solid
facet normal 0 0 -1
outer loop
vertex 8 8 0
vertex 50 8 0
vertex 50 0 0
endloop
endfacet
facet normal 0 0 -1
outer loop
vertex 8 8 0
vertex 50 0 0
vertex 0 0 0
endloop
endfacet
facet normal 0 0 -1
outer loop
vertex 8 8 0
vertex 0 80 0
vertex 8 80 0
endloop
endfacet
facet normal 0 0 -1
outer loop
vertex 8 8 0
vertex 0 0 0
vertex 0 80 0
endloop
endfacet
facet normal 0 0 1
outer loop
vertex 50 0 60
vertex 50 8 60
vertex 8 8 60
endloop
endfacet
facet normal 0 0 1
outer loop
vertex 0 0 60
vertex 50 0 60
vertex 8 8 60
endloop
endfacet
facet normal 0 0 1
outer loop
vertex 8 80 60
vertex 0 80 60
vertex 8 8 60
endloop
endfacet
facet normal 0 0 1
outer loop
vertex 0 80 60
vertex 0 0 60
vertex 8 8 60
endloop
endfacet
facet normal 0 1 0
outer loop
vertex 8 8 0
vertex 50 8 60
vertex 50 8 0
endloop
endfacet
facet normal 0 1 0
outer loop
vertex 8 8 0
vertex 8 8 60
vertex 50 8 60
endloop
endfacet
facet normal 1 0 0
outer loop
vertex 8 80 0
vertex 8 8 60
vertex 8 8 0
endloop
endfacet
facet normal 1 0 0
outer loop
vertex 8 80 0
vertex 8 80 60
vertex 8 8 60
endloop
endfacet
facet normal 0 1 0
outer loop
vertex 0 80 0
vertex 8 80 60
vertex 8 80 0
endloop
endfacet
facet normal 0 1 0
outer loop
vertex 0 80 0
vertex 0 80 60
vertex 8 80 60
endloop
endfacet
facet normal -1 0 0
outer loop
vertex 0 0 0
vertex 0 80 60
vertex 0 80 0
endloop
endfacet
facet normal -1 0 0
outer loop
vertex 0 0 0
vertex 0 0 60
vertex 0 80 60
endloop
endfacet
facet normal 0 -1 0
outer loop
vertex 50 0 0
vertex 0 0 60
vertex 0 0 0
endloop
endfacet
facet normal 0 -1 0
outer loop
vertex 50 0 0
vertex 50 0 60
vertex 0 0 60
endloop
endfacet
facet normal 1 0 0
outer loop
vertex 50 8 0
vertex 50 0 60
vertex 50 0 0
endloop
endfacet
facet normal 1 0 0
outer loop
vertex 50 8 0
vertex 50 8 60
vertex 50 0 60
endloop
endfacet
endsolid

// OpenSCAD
$fn = 32;

// ----------------------------------------------------------------------
// Structural section: angle 50 x 80 mm
// ----------------------------------------------------------------------

// --- parameters (mm) ---
sec_w = 50;               // leg width, X
sec_h = 80;               // leg height, Y
flange_t = 8;             // leg thickness
plate_t = 60;             // cut length, Z (extrusion height)

profile = [[0, 0], [50, 0], [50, 8], [8, 8], [8, 80], [0, 80]];  // primary outline, 6 points, counter clockwise

// --- the one profile operation ---
linear_extrude(height = plate_t) polygon(points = profile);
